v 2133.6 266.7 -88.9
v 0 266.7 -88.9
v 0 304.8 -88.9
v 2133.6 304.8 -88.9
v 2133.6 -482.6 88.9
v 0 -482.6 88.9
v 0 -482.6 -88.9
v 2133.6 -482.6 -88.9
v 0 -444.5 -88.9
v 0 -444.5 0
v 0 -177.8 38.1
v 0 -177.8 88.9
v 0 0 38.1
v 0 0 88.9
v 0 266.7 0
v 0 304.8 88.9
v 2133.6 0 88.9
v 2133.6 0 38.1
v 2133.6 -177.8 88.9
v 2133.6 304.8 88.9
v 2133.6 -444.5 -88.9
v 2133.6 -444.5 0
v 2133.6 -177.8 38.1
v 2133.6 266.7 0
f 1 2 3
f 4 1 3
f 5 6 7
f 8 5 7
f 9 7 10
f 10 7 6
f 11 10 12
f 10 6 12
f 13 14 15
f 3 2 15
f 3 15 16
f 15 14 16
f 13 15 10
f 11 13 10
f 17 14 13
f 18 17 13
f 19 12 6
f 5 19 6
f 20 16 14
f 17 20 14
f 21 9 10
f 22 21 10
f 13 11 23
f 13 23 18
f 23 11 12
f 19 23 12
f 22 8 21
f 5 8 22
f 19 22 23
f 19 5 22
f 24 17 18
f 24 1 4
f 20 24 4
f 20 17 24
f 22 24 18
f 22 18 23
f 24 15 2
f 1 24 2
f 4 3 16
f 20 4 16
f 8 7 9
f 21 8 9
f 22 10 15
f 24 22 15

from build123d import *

# Parameters (mm, degrees)
F0_W     = 177.8
F0_H     = 38.1
F1_DEPTH = 2133.6


with BuildPart() as f1:
    # F0 (on Right) → F1 (new body)
    with BuildSketch(Plane.YZ):
        Polygon((0, 38.1), (0, 0), (266.7, 0), (266.7, 88.9), (0, 88.9), align=None)
        with Locations((-88.9, 19.05)):
            Rectangle(F0_W, F0_H)
        Polygon((266.7, 88.9), (266.7, 0), (266.7, -88.9), (304.8, -88.9), (304.8, 88.9), align=None)
        Polygon((-444.5, 0), (-177.8, 0), (-177.8, 38.1), (-177.8, 88.9), (-444.5, 88.9), align=None)
        Polygon((-444.5, -88.9), (-444.5, 0), (-444.5, 88.9), (-482.6, 88.9), (-482.6, -88.9), align=None)
    extrude(amount=F1_DEPTH)


solid = f1.part
